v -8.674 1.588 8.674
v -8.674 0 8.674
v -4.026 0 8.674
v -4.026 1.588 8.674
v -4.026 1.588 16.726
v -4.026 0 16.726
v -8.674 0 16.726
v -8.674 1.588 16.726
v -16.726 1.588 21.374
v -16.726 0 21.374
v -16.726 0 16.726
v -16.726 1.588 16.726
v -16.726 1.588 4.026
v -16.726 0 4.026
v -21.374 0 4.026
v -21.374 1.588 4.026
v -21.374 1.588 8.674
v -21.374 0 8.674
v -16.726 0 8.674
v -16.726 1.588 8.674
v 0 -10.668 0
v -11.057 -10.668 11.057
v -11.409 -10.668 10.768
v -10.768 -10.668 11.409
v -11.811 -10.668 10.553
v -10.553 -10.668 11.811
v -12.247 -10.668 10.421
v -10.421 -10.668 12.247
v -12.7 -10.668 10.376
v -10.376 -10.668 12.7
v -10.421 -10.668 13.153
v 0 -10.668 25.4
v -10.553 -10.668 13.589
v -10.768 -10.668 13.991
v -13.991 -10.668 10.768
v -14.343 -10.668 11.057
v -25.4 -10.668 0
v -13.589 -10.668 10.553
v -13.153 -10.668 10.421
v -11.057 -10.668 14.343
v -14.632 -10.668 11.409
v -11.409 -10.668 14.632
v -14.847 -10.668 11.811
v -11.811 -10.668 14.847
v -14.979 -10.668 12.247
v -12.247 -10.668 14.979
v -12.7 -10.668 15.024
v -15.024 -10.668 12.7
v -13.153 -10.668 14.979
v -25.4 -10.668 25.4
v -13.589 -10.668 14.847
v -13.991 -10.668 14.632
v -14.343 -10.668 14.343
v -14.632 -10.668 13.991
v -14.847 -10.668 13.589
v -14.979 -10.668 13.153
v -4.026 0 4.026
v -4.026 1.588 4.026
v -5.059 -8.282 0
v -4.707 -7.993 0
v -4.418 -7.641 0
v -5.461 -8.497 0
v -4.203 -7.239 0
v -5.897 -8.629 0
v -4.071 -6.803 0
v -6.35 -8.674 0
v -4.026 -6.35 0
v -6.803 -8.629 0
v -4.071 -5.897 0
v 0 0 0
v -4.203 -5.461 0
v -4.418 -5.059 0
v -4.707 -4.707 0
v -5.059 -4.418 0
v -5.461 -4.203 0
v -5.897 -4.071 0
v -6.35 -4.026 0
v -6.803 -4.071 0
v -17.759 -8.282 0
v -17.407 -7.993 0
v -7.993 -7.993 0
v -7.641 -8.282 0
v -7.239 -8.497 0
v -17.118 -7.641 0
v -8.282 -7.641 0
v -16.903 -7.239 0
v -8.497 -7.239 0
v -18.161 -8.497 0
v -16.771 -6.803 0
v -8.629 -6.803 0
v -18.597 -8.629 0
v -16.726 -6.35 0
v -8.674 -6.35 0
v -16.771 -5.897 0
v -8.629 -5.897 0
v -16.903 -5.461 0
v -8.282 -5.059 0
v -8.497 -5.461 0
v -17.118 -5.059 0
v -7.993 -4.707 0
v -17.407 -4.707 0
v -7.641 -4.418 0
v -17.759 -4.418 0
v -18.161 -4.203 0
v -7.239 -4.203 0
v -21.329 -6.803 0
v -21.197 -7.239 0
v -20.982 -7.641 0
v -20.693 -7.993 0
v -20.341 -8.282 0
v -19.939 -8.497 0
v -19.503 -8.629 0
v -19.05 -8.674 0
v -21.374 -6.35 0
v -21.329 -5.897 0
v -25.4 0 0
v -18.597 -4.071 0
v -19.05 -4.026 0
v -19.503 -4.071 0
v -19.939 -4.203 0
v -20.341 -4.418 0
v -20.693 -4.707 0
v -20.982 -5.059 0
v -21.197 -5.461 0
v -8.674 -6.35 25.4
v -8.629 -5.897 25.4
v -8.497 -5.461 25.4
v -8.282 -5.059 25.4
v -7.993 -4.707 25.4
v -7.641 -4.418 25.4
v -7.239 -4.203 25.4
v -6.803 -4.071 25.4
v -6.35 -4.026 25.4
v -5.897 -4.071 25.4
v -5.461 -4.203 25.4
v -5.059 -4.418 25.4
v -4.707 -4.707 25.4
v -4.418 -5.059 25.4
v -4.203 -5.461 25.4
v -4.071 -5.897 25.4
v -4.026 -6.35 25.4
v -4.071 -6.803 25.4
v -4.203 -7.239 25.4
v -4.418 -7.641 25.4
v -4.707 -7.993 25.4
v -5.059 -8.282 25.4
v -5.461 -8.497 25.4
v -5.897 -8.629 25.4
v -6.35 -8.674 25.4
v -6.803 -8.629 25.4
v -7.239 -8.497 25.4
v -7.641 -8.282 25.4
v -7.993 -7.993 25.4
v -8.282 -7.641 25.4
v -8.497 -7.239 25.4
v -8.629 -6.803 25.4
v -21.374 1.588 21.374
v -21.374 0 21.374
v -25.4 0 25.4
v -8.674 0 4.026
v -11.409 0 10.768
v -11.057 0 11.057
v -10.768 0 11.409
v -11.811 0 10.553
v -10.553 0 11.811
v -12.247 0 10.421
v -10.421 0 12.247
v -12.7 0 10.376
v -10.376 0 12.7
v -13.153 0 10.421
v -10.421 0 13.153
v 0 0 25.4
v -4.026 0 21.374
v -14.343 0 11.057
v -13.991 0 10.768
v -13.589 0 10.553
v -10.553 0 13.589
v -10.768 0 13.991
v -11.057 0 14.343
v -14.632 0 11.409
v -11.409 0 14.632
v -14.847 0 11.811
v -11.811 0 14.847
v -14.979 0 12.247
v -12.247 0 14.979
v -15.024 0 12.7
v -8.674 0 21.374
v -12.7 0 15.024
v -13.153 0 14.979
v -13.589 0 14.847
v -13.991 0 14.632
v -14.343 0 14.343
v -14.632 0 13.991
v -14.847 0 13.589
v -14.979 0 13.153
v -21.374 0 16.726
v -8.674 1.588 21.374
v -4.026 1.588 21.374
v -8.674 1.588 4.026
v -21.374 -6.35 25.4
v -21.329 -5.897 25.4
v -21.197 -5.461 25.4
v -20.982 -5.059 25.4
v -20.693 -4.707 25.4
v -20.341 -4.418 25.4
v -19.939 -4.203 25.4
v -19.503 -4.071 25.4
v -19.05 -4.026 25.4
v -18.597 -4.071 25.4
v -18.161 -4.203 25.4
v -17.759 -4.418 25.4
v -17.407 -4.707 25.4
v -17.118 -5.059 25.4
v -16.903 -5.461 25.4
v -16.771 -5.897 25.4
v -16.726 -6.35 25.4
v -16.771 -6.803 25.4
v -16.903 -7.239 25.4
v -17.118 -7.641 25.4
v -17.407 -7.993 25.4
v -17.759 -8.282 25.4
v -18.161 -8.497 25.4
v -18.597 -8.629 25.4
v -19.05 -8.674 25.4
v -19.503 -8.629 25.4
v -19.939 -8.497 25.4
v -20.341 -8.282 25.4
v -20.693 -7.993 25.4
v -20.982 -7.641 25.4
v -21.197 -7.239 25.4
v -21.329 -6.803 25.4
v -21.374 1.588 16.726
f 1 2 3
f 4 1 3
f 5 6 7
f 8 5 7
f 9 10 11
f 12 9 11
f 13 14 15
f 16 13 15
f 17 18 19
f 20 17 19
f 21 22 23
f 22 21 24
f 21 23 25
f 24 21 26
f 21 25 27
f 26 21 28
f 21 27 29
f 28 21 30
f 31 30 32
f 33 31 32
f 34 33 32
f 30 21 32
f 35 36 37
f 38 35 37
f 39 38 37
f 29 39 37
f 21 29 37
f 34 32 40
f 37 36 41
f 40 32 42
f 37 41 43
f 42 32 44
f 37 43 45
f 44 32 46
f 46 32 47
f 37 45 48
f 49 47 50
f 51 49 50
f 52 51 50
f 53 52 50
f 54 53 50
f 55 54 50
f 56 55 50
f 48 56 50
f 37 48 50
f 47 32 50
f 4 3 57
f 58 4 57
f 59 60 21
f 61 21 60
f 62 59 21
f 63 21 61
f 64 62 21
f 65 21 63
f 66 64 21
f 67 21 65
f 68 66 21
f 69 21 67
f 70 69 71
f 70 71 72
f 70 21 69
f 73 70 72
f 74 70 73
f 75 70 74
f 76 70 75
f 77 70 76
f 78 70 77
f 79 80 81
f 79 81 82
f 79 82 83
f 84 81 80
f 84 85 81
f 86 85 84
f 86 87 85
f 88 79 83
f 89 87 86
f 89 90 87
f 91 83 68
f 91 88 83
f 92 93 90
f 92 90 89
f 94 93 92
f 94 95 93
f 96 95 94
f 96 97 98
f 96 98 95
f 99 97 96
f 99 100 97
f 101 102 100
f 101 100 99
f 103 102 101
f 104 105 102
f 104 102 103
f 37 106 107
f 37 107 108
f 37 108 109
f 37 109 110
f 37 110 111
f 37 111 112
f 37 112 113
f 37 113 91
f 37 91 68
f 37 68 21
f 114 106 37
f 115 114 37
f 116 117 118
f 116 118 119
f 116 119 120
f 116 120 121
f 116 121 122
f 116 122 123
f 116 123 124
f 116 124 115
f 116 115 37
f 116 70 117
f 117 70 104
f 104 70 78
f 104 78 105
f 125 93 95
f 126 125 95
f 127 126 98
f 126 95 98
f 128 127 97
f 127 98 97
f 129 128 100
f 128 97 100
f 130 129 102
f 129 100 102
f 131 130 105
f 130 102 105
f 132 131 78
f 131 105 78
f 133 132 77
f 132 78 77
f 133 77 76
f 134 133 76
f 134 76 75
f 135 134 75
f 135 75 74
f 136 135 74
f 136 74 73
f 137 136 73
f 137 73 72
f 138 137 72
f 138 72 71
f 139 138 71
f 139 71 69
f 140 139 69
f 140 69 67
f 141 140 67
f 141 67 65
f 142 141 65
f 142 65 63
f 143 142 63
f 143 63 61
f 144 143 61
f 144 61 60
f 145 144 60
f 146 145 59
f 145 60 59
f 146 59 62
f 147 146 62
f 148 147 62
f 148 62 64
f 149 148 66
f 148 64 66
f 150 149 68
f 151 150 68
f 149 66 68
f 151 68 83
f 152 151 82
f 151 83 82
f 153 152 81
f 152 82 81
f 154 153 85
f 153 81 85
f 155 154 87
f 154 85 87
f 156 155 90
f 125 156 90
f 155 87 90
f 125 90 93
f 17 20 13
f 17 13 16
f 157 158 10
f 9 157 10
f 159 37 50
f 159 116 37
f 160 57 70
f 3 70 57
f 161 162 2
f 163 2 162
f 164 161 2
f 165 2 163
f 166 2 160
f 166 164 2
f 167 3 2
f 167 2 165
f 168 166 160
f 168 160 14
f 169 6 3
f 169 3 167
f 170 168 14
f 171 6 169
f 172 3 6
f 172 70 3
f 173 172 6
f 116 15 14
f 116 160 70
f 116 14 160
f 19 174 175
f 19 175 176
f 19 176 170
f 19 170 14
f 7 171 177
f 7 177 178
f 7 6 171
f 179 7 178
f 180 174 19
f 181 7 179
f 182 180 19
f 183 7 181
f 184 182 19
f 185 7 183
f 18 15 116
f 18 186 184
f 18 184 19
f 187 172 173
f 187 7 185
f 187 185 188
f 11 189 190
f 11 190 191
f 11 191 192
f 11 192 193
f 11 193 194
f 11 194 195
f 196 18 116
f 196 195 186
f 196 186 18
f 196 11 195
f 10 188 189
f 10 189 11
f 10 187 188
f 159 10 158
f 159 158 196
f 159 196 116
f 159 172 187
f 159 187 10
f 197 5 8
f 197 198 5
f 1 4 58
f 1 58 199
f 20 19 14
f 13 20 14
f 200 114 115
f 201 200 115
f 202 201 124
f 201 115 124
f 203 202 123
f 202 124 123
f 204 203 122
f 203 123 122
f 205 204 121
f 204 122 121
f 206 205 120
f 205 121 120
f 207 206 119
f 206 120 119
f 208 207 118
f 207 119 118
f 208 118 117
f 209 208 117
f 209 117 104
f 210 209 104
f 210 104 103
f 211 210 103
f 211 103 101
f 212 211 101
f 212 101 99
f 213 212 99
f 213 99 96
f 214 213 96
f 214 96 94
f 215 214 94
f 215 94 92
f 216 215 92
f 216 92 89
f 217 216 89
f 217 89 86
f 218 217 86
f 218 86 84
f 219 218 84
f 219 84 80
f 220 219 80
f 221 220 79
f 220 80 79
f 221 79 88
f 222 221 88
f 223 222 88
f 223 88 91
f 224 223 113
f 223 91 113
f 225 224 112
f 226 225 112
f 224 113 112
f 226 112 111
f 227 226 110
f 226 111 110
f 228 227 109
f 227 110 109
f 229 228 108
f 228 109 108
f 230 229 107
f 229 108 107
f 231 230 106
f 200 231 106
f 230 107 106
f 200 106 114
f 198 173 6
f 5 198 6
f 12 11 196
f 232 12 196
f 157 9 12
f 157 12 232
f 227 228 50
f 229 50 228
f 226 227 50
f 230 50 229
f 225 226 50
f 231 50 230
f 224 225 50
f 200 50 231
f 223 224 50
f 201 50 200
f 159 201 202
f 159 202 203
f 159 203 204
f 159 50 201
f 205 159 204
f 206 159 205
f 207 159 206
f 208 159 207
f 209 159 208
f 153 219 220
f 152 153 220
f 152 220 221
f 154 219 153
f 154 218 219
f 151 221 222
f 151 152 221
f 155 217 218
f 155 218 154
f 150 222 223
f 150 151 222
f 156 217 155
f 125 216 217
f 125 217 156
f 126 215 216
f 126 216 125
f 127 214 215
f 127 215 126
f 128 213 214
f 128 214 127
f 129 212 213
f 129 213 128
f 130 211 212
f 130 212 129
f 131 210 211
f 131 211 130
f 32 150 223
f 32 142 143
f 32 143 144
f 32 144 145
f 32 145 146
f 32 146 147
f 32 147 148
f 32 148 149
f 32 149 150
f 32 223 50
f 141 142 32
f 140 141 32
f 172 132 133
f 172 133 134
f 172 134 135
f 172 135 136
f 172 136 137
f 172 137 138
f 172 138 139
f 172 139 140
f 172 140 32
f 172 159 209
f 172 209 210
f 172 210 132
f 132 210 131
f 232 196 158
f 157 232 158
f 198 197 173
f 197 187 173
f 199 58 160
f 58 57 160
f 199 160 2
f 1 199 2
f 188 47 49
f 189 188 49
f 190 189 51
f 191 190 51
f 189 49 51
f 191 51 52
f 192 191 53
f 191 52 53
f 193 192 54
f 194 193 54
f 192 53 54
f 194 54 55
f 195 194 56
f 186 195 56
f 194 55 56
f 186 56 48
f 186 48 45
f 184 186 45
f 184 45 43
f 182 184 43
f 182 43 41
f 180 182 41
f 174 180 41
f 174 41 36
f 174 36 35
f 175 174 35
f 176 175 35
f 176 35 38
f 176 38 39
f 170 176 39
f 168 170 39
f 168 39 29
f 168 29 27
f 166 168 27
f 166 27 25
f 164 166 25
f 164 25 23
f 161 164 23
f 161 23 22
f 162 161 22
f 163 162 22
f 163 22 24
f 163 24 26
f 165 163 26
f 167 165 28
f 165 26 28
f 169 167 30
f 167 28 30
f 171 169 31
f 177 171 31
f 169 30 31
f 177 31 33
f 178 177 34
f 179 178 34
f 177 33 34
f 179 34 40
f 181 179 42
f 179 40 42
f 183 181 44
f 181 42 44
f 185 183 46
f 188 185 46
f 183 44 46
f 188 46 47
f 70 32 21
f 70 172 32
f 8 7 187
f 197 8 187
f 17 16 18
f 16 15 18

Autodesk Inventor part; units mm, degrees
ref_plane "YZ Plane" through (0, 0, 0) normal (1, 0, 0) x (0, 1, 0)
ref_plane "XZ Plane" through (0, 0, 0) normal (0, 1, 0) x (-1, 0, 0)
ref_plane "XY Plane" through (0, 0, 0) normal (0, 0, 1) x (1, 0, 0)
sketch "Sketch1" plane through (0, 0, 0) normal (0, 1, 0) x (-1, 0, 0)
  line L0 (0, 0) -> (25.4, 0)
  line L1 (25.4, 0) -> (25.4, 25.4)
  line L2 (25.4, 25.4) -> (0, 25.4)
  line L3 (0, 25.4) -> (0, 0)
  line L4 (12.7, 25.4) -> (12.7, 0)
  line L5 (12.7, 25.4) -> (38.1, 25.4) construction
  line L6 (0, 12.7) -> (25.4, 12.7)
  line L7 (0, 12.7) -> (25.4, 12.7) construction
  line L8 (12.7, 6.35) -> (25.4, 6.35)
  line L9 (12.7, 6.35) -> (25.4, 6.35) construction
  line L10 (19.05, 0) -> (19.05, 12.7)
  line L11 (16.7259, 16.7259) -> (21.3741, 16.7259)
  line L12 (21.3741, 16.7259) -> (21.3741, 21.3741)
  line L13 (21.3741, 21.3741) -> (16.7259, 21.3741)
  line L14 (16.7259, 21.3741) -> (16.7259, 16.7259)
  line L15 (16.7259, 16.7259) -> (19.05, 19.05) construction
  line L16 (21.3741, 16.7259) -> (16.7259, 21.3741) construction
  line L17 (8.6741, 16.7259) -> (8.6741, 21.3741)
  line L18 (8.6741, 21.3741) -> (4.0259, 21.3741)
  line L19 (4.0259, 21.3741) -> (4.0259, 16.7259)
  line L20 (4.0259, 16.7259) -> (8.6741, 16.7259)
  line L21 (21.3741, 4.0259) -> (21.3741, 8.6741)
  line L22 (21.3741, 8.6741) -> (16.7259, 8.6741)
  line L23 (16.7259, 8.6741) -> (16.7259, 4.0259)
  line L24 (16.7259, 4.0259) -> (21.3741, 4.0259)
  line L25 (8.6741, 4.0259) -> (8.6741, 8.6741)
  line L26 (8.6741, 8.6741) -> (4.0259, 8.6741)
  line L27 (4.0259, 8.6741) -> (4.0259, 4.0259)
  line L28 (4.0259, 4.0259) -> (8.6741, 4.0259)
  circle A0 centre (12.7, 12.7) radius 2.3241
  dimension "d0" = 25.4
  dimension "d1" = 25.4
  dimension "d2" = 25.4
  dimension "d3" = 90
  dimension "d4" = 25.4
  dimension "d5" = 0
  dimension "d6" = 12.7
  dimension "d7" = 0
  dimension "d8" = 4.6482
  dimension "d9" = 4.6482
  dimension "d12" = 12.7
  dimension "d15" = 12.7
  dimension "d18" = 4.6482
extrude "Extrusion1" add sketch "Sketch1" along normal blind 1.5875 contours L24 L23 L8 L10 | L10 L8 L21 L24 | L23 L22 L10 L8 | L10 L22 L21 L8 | L14 L13 L12 L11 | L20 L19 L18 L17 | L28 L27 L26 L25
extrude "Extrusion2" add sketch "Sketch1" against normal blind 10.668 contours L3 L6 A0 L4 L0 | L4 L8 L23 L24 L10 L0 | L3 L2 L4 A0 L6 | L10 L24 L21 L8 L1 L0 | L4 A0 L6 L10 L22 L23 L8 | A0 L4 L6 | L6 L4 A0 | L24 L23 L8 L10 | L10 L8 L21 L24 | L4 L6 A0 | L23 L22 L10 L8 | L2 L1 L6 A0 L4 | L4 A0 L6 | L8 L21 L22 L10 L6 L1 | L10 L22 L21 L8 | L14 L13 L12 L11 | L20 L19 L18 L17 | L28 L27 L26 L25
hole "Hole1" at (-12.7, 0, 12.7) direction (0, -1, 0) diameter 4.6482 depth 32.3342 tip angle 118
sketch "Sketch2" plane through (0, 0, 0) normal (0, 0, -1) x (-1, 0, 0)
  line L0 (25.4, 0) -> (0, 0) projected
  line L1 (25.4, 0) -> (0, 0)
  line L2 (12.7, 2.032) -> (12.7, -10.668)
  line L3 (15.0241, -10.668) -> (10.3759, -10.668) projected
  line L4 (12.7, -5.334) -> (25.4, -5.334)
  line L5 (25.4, 0) -> (25.4, -10.668) projected
  line L6 (12.7, -5.334) -> (0, -5.334)
  line L7 (0, 0) -> (0, -10.668) projected
  circle A0 centre (19.05, -6.35) radius 2.3241
  circle A1 centre (6.35, -6.35) radius 2.3241
  dimension "d30" = 4.6482
extrude "Extrusion3" cut sketch "Sketch2" against normal through all contours A0 L4 | L4 A0 | A1 L6 | L6 A1
properties part number "odom connector"
